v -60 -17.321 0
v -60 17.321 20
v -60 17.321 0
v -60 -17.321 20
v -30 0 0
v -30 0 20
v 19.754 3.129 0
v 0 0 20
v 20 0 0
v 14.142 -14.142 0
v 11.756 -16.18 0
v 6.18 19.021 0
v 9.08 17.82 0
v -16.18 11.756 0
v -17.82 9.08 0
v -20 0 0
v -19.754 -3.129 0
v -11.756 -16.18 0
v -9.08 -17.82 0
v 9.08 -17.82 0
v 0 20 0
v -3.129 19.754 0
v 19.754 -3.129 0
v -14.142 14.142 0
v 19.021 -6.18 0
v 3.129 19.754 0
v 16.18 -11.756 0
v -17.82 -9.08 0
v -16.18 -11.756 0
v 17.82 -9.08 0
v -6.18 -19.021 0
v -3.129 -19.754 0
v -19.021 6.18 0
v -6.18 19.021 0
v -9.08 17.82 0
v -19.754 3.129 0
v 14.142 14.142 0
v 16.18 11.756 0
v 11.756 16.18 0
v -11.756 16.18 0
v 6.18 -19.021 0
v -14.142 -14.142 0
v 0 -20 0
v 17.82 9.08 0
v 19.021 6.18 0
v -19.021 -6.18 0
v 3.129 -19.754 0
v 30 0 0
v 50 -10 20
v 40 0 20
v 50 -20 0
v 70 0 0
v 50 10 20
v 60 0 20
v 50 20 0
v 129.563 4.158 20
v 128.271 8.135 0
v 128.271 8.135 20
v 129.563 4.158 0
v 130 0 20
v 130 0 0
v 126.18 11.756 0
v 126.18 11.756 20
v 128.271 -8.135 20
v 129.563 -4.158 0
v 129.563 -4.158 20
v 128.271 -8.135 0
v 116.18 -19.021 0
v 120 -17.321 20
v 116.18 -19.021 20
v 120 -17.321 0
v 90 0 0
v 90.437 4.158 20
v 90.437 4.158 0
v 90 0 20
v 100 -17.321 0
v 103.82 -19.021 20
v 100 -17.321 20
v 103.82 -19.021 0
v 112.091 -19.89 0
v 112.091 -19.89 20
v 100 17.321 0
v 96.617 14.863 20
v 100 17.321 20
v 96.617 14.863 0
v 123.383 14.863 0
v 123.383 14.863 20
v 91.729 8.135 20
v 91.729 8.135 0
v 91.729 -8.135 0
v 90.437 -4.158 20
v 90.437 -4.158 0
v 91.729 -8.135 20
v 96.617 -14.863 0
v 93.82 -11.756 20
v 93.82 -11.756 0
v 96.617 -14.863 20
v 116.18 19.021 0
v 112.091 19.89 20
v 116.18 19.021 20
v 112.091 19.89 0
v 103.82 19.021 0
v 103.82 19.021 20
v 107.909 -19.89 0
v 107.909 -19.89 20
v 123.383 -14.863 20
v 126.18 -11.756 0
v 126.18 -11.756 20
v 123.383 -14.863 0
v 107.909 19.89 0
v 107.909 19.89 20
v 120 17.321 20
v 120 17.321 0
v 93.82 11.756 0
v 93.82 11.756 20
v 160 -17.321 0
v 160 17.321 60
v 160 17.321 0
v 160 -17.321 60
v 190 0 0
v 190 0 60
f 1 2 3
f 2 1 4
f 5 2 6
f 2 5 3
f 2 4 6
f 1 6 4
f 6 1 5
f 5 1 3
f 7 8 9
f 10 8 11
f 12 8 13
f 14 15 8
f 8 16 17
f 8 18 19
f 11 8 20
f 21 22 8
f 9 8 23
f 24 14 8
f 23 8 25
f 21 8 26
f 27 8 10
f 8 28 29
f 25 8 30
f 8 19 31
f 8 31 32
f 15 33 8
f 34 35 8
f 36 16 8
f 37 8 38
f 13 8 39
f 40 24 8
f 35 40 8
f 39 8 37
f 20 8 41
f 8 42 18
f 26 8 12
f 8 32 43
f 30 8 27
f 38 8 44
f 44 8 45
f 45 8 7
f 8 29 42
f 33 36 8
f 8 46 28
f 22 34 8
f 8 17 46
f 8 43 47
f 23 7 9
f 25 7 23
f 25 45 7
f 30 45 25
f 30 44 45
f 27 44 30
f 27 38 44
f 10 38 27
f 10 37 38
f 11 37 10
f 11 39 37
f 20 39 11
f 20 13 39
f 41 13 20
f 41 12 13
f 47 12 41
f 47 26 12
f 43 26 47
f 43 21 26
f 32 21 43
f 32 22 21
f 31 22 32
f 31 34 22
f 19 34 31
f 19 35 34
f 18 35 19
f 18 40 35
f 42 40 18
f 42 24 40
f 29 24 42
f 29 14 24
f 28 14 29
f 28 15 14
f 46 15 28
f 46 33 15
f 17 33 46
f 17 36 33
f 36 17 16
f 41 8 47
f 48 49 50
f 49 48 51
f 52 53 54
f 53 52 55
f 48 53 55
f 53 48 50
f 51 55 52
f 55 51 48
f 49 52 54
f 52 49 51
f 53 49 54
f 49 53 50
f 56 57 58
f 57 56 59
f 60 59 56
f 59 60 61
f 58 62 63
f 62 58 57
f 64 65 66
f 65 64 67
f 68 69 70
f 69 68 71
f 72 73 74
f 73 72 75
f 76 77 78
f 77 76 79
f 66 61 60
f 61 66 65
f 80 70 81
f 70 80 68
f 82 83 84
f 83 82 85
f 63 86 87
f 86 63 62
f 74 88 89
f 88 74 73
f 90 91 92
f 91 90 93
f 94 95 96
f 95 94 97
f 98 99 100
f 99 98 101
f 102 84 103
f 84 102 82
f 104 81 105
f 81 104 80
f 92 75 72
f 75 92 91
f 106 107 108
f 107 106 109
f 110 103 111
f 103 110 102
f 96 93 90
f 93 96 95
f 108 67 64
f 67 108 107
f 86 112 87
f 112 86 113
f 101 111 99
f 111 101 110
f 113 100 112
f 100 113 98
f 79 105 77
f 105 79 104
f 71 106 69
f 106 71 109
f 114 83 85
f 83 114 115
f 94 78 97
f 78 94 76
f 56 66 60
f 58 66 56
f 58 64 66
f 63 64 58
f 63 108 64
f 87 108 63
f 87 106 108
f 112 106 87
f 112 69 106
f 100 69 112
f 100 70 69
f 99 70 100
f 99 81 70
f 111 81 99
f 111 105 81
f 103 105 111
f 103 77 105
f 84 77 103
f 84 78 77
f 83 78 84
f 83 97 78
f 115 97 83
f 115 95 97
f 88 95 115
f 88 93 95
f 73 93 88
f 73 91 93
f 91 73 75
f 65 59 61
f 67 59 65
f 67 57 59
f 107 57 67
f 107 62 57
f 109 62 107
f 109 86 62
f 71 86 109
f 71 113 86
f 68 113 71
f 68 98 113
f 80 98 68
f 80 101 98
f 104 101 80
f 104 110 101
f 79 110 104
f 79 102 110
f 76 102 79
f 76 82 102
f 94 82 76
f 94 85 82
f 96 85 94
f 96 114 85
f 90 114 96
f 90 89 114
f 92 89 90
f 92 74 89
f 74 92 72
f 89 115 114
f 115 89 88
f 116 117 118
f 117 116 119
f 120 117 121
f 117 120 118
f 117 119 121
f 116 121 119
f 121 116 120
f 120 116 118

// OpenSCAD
// originally from https://en.wikibooks.org/wiki/OpenSCAD_User_Manual/Primitive_Solids#cylinder

translate([-50, 0, 0])
cylinder(20,20,20, $fn=3);

color("pink")
translate([0, 0, 0])
cylinder(20,20,00, $fn=40);

color("blue")
translate([50, 0, 0])
cylinder(h=20, r1=20, r2=10, $fn=4);

color("green")
translate([110, 0, 0])
cylinder(h=20, r1=20, r2=20, $fn=30);

color("red")
translate([170, 0, 0])        
cylinder(r=20, h = 60, $fn=3);
